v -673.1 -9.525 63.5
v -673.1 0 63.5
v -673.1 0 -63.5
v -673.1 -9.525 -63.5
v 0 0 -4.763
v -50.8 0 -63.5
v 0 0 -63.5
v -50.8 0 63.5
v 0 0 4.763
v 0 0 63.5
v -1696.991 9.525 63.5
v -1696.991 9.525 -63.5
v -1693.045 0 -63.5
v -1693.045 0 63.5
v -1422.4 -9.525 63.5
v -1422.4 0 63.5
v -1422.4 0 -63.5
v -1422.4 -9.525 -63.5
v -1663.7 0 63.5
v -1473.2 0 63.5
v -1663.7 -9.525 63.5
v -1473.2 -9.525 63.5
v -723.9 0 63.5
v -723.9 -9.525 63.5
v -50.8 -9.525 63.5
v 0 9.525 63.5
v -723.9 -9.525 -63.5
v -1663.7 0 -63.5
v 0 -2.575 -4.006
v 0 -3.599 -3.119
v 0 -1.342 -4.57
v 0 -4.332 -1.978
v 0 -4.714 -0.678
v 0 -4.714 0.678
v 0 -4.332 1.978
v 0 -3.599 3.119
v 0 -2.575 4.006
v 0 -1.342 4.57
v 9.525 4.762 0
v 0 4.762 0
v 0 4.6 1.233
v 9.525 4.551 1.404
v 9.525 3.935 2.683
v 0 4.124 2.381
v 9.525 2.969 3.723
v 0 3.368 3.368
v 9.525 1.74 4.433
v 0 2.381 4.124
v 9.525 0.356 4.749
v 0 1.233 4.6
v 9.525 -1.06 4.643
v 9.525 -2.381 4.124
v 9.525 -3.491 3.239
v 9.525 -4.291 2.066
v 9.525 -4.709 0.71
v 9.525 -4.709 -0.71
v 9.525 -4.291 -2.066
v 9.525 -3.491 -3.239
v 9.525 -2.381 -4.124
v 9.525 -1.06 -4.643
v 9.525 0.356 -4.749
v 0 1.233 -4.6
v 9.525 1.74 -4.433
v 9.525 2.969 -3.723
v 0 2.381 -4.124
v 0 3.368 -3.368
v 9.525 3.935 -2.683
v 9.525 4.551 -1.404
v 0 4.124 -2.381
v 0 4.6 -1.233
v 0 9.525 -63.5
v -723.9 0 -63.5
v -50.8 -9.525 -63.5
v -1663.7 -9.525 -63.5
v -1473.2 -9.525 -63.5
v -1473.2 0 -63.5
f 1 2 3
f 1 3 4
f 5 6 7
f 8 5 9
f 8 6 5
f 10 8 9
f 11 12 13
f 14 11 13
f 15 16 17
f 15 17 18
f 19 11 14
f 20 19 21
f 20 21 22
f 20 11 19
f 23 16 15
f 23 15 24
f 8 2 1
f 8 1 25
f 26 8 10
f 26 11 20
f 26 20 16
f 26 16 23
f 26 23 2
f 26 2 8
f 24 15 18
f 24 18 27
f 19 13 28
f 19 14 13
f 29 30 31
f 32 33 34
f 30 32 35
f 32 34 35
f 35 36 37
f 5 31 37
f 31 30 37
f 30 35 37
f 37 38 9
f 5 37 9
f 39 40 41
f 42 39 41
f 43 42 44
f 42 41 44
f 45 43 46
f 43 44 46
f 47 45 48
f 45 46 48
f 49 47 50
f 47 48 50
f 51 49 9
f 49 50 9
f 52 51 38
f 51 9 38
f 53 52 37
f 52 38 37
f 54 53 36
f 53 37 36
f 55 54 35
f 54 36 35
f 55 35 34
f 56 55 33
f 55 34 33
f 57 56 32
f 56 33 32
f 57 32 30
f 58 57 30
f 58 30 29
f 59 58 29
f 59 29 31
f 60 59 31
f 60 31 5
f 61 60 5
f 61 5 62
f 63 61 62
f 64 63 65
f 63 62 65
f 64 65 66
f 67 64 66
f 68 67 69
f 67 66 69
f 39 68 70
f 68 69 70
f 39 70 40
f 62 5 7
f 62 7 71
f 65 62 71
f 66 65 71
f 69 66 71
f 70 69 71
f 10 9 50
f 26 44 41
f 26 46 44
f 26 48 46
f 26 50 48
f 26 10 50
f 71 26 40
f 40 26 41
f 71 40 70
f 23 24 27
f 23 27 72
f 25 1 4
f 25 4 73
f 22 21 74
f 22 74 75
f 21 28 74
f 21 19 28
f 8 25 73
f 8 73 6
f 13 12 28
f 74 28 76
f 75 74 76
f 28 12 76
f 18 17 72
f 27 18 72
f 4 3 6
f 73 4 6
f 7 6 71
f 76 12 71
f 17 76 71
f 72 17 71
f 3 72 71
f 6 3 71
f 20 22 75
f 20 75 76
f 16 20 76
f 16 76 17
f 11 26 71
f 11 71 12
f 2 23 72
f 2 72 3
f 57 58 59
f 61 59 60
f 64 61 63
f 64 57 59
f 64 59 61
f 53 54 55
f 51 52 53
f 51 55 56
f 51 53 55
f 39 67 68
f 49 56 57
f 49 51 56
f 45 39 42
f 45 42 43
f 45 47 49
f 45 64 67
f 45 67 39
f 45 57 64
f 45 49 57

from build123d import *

# Parameters (mm, degrees)
F1_DEPTH = 63.5
F2_R     = 4.7625
F3_DEPTH = 9.525


with BuildPart() as f1:
    # F0 (on Top) → F1 (new body, symmetric)
    with BuildSketch(Plane.XY):
        Polygon((-1663.7, 0), (-1663.7, -9.525), (-1473.2, -9.525), (-1473.2, 0), (-1422.4, 0), (-1422.4, -9.525), (-723.9, -9.525), (-723.9, 0), (-673.1, 0), (-673.1, -9.525), (-50.8, -9.525), (-50.8, 0), (0, 0), (0, 9.525), (-1696.990768, 9.525), (-1693.045384, 0), align=None)
    extrude(amount=F1_DEPTH, both=True)

    # F2 (on Right) → F3 (join)
    with BuildSketch(Plane.YZ):
        Circle(F2_R)
    extrude(amount=F3_DEPTH)


solid = f1.part
